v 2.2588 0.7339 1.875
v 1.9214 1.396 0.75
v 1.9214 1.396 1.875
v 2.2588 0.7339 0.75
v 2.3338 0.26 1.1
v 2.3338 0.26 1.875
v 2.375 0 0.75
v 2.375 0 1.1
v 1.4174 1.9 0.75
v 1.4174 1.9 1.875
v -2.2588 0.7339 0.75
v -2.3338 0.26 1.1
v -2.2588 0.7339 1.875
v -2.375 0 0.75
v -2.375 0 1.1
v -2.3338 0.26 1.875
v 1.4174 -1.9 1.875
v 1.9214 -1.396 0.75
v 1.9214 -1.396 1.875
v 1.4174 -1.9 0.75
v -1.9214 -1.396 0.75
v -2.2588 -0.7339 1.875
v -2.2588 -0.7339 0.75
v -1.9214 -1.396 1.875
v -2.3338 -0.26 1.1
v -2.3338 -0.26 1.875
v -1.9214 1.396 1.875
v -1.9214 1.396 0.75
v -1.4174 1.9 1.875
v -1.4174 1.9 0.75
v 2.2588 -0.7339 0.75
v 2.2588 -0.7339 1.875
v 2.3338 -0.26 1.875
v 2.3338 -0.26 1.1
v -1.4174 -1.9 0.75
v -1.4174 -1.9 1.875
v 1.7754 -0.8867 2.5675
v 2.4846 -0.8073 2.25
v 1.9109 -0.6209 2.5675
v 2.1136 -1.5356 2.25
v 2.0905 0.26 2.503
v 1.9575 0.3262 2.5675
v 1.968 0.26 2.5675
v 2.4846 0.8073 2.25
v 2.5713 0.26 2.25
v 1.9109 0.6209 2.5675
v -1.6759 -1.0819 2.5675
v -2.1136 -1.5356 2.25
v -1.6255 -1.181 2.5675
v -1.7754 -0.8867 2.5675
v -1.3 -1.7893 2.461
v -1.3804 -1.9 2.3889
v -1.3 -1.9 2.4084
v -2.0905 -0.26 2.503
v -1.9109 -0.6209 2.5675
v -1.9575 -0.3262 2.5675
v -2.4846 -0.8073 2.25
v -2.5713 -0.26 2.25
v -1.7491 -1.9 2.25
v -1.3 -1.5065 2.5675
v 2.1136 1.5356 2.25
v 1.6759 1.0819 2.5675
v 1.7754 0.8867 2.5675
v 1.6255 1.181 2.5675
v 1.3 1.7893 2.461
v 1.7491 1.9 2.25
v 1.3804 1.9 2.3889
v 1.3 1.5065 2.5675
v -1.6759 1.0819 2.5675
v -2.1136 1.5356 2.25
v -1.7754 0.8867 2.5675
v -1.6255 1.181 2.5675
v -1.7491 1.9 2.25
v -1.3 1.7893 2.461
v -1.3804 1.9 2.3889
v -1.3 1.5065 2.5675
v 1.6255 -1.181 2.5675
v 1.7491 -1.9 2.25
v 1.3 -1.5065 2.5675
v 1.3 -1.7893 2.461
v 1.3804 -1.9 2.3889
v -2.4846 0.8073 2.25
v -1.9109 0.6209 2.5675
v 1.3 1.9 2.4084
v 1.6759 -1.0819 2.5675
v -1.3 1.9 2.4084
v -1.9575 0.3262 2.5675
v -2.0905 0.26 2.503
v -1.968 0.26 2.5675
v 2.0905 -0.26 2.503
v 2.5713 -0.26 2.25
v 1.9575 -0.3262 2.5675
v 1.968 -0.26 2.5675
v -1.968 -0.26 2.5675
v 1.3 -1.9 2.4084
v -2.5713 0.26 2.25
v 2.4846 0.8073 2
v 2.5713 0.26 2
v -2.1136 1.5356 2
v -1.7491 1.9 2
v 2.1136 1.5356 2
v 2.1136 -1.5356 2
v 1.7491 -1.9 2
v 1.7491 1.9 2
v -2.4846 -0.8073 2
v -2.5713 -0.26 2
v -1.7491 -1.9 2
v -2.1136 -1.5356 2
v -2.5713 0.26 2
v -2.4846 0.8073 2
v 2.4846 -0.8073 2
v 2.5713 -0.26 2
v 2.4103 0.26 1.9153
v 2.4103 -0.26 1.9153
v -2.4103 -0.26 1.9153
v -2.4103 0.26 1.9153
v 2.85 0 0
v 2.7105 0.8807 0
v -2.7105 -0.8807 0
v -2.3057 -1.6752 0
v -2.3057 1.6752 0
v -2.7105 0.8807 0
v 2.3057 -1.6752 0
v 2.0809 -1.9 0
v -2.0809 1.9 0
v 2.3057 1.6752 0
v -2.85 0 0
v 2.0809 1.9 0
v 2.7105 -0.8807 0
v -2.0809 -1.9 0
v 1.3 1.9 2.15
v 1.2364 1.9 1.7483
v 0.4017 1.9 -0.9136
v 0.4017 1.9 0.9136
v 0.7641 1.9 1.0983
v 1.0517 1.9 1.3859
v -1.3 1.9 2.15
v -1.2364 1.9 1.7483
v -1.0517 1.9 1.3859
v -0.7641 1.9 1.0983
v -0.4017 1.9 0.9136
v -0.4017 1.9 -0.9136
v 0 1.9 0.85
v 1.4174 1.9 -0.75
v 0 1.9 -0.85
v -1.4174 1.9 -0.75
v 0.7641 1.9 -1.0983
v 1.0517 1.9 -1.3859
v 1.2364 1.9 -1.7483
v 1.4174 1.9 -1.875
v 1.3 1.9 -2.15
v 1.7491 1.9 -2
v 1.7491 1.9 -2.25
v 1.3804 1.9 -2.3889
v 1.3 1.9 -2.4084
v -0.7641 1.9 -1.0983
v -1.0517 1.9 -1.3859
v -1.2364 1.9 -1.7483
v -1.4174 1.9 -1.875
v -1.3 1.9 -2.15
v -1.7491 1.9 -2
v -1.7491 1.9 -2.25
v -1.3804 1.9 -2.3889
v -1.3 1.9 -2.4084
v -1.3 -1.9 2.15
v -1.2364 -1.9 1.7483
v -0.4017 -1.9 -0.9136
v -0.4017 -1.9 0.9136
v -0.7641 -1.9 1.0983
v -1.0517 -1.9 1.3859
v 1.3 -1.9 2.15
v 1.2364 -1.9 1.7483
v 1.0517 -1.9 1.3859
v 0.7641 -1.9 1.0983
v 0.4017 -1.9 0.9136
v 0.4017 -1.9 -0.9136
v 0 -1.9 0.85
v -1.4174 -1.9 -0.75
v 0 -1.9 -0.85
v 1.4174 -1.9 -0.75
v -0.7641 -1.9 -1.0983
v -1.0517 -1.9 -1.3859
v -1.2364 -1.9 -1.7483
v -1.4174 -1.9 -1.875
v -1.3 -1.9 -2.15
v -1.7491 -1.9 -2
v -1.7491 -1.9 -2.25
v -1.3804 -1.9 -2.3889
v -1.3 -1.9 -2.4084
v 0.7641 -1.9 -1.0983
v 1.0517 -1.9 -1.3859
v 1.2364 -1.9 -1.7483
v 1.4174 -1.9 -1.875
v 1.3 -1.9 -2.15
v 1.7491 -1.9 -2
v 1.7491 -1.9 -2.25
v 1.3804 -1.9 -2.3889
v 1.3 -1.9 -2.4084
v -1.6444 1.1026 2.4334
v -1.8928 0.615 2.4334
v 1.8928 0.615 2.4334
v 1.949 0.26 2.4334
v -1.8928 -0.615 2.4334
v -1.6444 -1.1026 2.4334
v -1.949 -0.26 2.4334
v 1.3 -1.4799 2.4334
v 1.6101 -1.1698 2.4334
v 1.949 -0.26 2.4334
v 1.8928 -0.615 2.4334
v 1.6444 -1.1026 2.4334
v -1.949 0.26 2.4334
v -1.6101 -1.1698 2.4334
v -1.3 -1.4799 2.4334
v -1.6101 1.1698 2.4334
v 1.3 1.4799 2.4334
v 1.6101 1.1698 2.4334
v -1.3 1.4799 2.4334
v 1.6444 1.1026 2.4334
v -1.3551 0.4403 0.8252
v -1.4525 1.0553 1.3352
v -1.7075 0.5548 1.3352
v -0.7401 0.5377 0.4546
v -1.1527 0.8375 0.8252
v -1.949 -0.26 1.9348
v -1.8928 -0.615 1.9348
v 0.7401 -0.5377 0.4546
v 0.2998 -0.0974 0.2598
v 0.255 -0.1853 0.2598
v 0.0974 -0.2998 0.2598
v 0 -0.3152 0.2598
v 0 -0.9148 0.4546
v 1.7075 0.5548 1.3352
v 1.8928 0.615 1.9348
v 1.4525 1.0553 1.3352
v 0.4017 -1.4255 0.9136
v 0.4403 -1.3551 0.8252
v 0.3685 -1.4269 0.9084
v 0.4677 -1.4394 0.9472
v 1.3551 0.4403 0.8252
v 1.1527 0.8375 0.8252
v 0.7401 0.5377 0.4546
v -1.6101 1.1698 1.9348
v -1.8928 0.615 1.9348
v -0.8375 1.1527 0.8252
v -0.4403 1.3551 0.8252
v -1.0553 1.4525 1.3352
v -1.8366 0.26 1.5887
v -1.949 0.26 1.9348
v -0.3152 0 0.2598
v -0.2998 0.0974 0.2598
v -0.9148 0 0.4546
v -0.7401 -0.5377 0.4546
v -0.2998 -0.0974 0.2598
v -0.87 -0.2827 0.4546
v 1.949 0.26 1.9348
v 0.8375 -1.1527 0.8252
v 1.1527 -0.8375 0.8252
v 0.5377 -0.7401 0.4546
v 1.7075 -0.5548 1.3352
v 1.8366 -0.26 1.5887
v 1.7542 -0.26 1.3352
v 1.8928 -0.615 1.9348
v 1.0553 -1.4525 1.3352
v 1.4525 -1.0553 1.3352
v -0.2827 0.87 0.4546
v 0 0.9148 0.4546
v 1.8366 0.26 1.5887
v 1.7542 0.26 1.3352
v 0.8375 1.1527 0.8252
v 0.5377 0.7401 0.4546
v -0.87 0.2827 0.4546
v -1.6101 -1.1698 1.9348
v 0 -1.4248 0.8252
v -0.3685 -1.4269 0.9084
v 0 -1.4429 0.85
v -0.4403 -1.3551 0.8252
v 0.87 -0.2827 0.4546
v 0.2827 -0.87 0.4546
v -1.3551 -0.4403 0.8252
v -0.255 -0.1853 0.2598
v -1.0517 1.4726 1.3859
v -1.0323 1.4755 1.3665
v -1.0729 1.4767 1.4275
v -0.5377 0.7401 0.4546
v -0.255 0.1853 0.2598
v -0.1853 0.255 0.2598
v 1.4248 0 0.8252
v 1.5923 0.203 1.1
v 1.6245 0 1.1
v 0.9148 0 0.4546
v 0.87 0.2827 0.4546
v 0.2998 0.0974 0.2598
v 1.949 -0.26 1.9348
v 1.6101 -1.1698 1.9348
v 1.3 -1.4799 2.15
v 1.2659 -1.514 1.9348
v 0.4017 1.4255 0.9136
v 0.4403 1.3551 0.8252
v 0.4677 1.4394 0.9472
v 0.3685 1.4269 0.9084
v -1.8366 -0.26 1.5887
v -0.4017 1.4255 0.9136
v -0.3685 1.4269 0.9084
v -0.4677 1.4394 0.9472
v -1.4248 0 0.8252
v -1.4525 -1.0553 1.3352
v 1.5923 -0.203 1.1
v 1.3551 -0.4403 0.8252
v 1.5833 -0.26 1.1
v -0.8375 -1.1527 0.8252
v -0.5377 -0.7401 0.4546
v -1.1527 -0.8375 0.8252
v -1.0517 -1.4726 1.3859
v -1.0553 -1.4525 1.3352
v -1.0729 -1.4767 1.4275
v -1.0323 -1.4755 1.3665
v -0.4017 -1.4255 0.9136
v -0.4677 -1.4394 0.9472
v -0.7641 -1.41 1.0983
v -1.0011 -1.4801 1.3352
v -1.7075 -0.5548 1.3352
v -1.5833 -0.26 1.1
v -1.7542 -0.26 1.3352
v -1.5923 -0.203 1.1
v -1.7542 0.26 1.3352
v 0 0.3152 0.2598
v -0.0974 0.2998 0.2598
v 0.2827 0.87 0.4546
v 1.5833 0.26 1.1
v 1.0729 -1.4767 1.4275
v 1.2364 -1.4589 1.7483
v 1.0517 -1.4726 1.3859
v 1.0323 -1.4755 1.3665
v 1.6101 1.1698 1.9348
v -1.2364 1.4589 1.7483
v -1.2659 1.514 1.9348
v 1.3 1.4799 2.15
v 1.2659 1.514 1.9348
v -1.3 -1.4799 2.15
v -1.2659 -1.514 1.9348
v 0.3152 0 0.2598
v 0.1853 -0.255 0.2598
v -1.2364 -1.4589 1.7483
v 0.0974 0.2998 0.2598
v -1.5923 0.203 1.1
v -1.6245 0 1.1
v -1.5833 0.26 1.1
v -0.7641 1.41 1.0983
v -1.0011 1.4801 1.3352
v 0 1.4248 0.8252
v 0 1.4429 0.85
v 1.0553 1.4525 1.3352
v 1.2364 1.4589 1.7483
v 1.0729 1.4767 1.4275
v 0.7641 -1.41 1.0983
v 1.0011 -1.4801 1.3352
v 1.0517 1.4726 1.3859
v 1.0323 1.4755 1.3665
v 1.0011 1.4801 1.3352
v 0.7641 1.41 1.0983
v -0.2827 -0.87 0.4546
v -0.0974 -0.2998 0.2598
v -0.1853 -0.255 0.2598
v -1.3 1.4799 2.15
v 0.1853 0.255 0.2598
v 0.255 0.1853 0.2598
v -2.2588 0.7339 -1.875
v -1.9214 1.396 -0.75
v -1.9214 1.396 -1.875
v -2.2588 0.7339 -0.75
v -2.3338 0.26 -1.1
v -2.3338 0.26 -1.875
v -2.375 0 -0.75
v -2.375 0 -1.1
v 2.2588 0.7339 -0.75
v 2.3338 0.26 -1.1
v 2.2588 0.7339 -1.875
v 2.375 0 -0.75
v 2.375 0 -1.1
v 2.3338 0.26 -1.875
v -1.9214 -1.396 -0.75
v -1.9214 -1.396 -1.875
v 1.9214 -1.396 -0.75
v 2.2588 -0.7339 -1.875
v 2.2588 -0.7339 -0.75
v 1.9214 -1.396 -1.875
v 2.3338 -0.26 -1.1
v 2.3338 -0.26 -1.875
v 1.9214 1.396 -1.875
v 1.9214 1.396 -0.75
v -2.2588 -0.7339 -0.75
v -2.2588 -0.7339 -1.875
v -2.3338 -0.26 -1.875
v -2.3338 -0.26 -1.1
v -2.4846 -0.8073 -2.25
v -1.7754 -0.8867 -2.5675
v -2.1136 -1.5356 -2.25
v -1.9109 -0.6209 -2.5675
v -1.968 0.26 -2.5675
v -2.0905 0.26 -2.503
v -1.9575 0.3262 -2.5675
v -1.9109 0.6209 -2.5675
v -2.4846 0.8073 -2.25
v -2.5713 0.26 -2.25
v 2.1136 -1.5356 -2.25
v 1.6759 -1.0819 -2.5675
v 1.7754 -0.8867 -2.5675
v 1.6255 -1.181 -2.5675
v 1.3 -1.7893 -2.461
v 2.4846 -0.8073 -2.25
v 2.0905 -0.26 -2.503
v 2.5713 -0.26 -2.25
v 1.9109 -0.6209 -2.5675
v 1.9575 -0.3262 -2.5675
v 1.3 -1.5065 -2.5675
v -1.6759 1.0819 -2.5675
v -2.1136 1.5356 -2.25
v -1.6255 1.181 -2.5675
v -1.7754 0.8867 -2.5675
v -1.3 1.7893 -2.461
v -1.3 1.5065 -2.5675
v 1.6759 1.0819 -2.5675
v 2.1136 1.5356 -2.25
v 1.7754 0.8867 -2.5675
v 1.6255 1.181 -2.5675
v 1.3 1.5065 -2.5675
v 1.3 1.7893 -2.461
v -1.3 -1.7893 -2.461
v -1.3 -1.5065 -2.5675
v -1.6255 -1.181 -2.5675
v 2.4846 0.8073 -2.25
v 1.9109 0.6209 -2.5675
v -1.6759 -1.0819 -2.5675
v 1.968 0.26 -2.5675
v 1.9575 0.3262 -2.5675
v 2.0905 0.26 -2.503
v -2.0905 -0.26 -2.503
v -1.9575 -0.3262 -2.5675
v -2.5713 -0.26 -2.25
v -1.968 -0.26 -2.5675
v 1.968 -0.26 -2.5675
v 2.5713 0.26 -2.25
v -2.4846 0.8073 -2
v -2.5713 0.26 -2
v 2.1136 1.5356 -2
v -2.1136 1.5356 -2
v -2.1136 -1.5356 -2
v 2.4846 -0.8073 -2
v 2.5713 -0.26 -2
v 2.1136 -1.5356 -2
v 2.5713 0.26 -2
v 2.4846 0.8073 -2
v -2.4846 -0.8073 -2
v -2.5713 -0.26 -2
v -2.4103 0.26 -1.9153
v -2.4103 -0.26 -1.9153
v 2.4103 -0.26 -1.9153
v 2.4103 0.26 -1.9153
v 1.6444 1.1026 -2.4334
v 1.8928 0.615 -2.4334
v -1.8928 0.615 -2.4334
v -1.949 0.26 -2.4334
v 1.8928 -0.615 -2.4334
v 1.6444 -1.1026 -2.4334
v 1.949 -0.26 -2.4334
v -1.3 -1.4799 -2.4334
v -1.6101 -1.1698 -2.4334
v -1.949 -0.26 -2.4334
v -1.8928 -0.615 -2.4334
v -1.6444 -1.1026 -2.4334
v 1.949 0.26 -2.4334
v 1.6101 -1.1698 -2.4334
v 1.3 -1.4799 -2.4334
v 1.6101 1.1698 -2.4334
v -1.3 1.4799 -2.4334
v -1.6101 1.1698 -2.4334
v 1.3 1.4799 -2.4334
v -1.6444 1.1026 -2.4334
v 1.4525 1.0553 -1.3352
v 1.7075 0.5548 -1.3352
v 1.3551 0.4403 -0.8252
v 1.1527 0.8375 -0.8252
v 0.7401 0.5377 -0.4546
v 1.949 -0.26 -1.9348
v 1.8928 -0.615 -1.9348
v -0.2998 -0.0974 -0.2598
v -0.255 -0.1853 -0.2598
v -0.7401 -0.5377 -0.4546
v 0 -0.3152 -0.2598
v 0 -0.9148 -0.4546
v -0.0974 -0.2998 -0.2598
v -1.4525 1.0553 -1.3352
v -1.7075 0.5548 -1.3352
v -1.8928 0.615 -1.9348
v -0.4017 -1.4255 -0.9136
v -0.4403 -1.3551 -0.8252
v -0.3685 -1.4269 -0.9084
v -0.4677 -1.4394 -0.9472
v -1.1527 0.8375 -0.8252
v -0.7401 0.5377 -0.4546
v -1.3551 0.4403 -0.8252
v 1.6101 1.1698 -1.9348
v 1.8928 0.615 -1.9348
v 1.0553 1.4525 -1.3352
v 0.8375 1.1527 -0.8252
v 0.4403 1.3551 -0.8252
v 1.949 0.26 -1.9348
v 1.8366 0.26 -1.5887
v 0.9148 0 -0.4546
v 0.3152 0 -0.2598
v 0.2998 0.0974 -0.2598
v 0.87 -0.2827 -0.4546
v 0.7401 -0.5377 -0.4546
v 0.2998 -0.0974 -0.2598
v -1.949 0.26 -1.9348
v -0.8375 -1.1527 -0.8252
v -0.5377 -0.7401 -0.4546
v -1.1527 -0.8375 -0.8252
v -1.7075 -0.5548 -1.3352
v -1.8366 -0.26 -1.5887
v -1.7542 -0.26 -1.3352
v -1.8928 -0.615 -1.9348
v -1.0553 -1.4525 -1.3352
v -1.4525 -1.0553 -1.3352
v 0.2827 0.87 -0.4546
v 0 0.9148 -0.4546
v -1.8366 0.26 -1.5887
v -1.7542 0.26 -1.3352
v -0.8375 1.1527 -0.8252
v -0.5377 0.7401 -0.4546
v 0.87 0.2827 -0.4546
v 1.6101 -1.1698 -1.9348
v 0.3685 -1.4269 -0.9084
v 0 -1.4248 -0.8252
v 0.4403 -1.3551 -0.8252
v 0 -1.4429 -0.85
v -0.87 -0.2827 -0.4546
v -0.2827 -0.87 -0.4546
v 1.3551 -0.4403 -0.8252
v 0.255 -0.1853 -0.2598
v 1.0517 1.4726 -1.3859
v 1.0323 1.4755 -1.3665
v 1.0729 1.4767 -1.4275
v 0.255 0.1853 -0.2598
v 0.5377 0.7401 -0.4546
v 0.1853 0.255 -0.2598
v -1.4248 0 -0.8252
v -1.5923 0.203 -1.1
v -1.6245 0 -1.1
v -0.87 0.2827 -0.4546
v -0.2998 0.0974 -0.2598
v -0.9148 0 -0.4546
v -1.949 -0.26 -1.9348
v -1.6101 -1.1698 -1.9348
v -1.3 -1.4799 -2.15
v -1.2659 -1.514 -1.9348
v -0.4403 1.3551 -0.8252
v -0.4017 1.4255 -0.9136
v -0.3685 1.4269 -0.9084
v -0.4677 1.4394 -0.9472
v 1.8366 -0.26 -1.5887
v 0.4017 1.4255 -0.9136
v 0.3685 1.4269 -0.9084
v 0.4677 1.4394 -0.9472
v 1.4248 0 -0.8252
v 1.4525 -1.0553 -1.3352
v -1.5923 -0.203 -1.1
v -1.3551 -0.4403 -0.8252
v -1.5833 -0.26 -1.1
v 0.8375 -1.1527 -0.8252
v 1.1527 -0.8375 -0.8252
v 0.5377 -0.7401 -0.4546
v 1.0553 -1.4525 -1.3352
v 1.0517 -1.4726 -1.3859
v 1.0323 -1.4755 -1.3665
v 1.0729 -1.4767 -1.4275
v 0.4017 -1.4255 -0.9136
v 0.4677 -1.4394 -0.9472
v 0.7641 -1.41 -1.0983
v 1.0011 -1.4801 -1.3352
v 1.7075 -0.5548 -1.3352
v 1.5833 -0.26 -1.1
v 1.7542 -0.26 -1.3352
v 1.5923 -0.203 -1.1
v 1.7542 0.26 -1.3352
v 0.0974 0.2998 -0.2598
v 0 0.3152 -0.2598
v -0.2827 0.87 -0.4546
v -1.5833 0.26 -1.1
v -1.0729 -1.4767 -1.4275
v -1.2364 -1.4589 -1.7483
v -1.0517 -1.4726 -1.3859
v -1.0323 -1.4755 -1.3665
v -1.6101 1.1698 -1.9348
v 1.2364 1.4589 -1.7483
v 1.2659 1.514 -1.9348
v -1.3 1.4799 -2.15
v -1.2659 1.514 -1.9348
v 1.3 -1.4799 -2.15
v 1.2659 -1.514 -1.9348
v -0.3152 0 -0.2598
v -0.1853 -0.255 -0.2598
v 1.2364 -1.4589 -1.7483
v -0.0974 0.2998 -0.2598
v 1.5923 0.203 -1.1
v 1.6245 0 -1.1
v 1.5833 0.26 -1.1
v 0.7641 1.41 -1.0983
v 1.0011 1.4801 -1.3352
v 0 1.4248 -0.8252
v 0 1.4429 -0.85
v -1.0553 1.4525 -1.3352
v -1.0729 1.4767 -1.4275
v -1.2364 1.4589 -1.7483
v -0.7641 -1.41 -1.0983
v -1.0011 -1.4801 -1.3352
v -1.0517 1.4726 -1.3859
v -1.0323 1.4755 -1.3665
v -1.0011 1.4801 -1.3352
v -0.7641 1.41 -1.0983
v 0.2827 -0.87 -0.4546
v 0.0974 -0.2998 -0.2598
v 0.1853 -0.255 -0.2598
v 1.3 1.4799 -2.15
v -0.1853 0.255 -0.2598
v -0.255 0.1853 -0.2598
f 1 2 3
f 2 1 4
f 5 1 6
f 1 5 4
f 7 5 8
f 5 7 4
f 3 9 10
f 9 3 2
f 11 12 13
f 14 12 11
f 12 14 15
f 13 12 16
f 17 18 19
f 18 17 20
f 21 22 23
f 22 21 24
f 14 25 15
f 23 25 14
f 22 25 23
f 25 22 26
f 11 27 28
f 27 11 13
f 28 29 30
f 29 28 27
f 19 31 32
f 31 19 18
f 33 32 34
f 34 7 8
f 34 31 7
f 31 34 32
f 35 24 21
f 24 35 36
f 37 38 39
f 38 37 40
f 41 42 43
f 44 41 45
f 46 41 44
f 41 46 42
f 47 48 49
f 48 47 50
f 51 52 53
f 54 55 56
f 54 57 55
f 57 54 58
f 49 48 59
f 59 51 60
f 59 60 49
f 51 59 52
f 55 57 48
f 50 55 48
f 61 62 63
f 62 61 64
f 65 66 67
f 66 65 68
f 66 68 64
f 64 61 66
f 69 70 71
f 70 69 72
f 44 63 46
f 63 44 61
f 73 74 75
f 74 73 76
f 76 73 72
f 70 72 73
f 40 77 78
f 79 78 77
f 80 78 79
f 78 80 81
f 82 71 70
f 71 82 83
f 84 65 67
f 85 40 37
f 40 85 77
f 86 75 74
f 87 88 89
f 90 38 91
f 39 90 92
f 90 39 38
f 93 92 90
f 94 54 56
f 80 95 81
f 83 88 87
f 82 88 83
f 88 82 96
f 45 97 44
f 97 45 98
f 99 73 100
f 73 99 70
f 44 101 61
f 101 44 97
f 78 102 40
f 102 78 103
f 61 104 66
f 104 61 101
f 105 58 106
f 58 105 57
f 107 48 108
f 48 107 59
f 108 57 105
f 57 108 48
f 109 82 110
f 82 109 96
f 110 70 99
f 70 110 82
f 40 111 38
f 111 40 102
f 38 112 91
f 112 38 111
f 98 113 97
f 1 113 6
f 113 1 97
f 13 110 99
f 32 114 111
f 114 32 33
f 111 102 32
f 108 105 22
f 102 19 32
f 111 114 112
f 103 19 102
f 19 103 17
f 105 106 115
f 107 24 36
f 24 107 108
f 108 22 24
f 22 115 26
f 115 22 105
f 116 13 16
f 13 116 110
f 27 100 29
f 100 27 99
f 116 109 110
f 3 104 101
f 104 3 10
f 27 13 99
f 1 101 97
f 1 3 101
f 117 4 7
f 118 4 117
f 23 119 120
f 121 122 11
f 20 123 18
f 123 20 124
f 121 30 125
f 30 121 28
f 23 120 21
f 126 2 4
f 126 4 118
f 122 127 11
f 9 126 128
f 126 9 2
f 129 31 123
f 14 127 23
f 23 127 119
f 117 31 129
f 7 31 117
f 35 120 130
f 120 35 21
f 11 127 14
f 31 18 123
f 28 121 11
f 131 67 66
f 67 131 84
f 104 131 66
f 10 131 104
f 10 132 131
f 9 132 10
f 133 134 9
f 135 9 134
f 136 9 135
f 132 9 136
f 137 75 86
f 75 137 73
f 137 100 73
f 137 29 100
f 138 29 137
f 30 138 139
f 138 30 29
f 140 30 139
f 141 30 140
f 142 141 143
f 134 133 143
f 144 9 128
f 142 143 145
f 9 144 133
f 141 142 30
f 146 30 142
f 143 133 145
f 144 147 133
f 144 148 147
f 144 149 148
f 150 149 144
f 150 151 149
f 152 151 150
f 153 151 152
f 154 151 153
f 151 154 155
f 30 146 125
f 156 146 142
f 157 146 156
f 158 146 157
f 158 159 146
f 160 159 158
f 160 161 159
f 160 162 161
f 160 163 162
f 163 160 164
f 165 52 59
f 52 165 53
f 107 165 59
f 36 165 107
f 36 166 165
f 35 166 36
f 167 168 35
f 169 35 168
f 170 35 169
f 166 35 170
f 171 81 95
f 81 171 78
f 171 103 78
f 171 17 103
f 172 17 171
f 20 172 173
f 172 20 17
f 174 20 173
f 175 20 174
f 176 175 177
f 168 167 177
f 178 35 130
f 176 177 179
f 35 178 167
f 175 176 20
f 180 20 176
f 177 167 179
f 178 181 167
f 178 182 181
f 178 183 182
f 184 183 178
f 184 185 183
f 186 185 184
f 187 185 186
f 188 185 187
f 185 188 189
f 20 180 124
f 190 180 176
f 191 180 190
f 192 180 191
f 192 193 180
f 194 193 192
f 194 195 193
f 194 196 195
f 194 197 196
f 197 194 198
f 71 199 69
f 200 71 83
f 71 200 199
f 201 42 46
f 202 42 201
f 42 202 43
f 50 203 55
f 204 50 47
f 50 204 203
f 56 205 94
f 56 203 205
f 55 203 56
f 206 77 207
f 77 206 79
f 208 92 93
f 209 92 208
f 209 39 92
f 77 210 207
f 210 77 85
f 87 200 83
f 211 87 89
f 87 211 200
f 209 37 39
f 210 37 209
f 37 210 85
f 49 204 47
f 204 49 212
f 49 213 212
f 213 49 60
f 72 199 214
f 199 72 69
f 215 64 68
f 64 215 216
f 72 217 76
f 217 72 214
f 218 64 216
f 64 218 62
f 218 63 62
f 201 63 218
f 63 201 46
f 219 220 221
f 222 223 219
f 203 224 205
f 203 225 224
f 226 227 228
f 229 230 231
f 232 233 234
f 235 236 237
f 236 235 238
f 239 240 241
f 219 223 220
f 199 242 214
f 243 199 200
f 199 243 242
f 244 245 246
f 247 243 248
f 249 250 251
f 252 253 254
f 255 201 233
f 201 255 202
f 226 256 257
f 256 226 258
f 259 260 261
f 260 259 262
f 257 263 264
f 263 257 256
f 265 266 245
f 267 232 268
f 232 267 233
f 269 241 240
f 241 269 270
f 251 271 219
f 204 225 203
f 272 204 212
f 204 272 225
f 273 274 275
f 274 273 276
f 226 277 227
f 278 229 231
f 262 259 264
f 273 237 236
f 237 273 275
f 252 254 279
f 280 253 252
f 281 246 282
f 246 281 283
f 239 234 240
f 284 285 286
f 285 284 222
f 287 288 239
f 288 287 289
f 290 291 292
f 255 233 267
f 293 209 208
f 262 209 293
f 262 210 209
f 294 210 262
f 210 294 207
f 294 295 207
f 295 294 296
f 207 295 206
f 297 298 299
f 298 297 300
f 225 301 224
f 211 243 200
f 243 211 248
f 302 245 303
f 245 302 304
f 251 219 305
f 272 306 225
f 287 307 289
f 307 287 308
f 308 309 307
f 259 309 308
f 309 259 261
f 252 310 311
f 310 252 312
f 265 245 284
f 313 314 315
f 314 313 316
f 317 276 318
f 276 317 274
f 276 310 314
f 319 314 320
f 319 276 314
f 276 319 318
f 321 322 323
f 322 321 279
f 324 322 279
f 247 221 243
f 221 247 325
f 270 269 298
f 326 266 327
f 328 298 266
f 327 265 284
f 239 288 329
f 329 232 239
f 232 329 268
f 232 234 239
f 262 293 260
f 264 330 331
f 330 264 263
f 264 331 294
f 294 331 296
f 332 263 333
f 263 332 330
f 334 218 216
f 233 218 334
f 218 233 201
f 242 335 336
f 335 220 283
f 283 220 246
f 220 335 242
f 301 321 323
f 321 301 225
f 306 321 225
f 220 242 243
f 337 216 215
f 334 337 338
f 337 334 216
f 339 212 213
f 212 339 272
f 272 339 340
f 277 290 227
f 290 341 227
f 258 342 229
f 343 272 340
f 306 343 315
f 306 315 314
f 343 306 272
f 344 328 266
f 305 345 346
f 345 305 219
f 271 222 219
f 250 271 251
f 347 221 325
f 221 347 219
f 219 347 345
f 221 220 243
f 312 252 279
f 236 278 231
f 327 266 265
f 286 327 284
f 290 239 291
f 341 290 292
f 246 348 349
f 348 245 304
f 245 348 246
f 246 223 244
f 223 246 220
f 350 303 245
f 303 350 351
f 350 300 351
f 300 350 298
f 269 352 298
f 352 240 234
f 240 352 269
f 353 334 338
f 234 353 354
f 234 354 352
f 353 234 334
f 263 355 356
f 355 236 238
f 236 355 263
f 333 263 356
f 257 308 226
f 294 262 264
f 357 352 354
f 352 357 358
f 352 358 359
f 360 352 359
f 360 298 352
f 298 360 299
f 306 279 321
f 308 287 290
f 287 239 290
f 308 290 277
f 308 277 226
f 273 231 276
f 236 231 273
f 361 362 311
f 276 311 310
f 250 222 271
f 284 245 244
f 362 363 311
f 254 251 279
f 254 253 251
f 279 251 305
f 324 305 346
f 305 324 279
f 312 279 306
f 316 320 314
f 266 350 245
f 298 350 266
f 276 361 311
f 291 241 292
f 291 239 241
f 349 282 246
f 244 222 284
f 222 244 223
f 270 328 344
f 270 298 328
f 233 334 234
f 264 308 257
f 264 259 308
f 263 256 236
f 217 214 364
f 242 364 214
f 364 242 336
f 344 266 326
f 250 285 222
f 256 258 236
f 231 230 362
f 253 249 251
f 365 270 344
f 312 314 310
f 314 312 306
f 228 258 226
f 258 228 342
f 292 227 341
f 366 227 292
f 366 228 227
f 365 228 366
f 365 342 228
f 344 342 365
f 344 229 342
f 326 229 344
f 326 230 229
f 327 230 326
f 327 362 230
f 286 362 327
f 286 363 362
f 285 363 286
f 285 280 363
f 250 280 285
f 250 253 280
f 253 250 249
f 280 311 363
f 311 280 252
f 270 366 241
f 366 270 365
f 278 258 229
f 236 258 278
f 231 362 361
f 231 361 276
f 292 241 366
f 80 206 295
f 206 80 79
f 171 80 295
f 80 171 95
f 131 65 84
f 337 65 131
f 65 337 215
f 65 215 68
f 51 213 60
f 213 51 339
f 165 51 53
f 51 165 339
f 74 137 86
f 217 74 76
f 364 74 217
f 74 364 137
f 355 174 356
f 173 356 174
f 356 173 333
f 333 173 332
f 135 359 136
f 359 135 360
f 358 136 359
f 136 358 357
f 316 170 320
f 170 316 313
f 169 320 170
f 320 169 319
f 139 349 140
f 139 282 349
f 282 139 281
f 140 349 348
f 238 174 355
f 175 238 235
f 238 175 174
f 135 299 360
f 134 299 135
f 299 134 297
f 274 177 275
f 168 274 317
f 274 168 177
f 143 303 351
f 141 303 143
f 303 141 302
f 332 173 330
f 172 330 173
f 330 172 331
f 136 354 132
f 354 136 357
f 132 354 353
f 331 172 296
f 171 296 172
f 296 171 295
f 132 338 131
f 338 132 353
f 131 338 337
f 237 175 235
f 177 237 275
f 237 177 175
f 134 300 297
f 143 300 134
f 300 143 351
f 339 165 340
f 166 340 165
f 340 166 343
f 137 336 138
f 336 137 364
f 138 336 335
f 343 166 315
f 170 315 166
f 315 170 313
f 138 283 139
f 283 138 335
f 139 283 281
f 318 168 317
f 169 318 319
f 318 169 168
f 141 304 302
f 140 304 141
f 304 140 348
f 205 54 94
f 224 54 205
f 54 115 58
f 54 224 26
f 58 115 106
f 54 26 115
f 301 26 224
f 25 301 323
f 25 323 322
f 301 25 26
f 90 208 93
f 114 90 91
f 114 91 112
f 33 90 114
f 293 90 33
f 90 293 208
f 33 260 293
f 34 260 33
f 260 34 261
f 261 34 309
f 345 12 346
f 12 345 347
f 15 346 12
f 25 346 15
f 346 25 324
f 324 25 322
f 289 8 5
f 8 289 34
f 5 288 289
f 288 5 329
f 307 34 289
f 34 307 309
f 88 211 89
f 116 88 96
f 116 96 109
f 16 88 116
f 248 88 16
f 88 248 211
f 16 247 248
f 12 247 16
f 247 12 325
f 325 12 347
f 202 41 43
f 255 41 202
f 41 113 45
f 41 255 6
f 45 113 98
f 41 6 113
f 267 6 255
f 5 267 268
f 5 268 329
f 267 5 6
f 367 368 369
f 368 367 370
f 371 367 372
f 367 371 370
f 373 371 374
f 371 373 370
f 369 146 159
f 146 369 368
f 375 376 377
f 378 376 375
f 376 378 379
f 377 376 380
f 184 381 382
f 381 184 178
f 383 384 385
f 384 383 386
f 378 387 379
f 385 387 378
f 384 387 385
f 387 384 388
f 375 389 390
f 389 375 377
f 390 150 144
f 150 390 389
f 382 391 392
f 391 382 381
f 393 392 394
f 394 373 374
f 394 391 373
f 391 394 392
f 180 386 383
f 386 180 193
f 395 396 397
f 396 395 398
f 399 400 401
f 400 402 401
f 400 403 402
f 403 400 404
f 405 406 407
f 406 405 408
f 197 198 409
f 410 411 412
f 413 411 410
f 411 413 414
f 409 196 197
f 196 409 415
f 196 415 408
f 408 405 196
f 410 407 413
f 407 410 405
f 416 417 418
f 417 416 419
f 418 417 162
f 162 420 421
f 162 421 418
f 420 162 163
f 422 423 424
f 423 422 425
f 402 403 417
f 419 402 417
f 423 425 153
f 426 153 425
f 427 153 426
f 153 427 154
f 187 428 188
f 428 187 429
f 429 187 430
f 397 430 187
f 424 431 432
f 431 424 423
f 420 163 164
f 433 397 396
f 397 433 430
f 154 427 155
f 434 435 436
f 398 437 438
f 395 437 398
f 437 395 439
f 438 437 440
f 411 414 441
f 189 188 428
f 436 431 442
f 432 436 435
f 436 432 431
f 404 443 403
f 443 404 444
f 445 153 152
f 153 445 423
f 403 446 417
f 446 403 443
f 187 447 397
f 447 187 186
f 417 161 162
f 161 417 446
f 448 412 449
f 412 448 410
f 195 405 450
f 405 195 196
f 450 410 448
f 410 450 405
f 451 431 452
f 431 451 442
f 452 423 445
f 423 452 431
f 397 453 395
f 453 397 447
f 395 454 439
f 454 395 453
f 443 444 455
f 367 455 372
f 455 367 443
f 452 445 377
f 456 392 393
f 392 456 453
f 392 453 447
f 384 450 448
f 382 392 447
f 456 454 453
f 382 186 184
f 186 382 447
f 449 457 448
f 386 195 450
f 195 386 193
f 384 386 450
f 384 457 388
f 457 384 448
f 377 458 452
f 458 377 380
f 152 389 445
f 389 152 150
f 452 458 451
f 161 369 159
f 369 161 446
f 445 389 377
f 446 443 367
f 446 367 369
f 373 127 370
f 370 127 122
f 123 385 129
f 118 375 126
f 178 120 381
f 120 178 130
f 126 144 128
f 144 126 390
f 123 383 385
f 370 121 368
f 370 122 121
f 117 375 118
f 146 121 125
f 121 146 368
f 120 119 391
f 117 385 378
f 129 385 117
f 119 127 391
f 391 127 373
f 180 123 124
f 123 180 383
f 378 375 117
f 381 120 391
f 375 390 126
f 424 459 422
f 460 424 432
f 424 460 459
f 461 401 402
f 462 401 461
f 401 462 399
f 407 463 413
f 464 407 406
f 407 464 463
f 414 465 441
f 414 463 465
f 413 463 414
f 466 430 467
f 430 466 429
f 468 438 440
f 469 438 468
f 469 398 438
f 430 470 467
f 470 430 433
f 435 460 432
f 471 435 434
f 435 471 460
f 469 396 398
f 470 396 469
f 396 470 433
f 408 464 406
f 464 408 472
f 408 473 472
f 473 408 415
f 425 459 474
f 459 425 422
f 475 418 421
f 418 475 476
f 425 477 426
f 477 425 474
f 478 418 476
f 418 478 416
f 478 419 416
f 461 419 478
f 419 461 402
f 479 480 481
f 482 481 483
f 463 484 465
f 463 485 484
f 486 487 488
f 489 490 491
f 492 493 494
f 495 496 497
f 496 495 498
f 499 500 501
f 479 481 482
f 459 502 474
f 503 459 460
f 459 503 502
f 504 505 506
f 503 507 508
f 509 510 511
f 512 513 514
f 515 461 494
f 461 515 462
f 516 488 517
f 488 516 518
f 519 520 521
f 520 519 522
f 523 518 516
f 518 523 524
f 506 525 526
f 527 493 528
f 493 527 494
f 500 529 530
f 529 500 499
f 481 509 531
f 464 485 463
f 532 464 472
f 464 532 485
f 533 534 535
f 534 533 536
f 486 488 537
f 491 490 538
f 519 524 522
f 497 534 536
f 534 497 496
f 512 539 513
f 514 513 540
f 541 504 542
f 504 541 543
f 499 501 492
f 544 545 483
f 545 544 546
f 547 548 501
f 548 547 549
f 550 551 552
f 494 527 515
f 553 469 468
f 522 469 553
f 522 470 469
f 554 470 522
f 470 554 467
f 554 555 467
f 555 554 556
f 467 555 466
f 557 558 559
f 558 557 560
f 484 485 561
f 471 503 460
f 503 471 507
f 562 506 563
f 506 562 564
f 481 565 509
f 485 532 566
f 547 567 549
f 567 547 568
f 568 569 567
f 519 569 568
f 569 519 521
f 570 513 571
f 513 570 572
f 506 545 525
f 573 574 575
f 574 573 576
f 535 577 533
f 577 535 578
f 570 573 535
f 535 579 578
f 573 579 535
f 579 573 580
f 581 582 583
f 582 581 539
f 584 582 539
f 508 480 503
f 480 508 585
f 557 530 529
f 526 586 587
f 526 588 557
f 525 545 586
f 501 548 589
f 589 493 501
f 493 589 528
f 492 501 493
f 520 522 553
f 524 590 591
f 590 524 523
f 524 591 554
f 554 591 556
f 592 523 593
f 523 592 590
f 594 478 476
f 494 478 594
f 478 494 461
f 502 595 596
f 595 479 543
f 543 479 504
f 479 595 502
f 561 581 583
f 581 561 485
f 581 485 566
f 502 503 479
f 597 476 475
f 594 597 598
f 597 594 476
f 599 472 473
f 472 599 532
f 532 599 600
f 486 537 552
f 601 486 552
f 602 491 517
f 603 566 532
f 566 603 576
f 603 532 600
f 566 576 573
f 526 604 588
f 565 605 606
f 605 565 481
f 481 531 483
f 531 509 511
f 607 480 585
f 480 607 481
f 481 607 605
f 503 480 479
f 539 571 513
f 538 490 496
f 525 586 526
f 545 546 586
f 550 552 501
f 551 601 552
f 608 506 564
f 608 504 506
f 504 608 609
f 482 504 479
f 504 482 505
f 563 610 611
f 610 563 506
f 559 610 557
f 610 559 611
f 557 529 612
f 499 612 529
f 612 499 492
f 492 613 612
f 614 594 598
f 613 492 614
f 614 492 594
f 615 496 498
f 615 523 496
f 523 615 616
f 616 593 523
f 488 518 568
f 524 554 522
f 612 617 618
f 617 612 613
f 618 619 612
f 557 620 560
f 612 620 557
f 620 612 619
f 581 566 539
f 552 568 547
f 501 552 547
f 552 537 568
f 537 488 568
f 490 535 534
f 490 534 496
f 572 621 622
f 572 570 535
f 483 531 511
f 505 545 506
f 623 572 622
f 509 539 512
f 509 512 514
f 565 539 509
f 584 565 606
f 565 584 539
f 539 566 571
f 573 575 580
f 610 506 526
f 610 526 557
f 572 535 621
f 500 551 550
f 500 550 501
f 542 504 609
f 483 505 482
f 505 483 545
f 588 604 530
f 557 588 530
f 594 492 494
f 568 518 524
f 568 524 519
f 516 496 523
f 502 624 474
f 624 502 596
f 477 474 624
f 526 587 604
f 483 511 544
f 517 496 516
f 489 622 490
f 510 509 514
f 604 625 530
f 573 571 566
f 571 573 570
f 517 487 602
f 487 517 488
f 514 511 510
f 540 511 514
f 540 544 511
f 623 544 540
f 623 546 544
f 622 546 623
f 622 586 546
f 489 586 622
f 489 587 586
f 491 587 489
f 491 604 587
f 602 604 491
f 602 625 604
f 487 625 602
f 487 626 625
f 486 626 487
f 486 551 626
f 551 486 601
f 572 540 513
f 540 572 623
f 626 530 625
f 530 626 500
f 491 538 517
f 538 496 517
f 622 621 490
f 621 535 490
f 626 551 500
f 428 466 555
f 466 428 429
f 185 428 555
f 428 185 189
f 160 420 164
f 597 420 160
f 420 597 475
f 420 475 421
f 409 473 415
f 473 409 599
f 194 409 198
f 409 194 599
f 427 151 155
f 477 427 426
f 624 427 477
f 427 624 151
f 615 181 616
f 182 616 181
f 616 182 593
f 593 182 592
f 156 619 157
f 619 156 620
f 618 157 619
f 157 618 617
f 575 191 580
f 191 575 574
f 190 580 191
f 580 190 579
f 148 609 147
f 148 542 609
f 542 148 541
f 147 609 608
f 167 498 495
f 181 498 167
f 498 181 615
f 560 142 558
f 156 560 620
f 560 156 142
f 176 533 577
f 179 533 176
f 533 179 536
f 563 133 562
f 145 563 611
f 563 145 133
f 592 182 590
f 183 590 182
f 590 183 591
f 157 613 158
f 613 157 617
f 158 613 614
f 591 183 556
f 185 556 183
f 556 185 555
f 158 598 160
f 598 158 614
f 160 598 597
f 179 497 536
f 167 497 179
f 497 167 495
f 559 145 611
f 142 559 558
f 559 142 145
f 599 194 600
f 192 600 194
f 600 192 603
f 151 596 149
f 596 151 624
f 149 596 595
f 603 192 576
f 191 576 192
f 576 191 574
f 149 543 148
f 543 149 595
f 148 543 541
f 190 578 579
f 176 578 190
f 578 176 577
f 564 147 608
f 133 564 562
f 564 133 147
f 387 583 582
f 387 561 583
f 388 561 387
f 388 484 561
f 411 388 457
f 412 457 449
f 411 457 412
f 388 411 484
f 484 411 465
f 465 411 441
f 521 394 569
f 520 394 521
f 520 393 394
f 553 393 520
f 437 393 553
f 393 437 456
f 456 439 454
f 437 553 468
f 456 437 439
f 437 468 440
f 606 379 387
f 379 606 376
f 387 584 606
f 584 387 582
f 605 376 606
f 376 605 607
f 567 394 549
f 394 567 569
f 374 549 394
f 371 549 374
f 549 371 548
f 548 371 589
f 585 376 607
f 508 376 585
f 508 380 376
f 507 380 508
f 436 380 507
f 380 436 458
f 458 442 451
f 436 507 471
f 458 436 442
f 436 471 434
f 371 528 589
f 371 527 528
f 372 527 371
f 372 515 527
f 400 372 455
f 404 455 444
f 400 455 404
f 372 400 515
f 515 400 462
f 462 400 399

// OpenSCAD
module pin(
pin_d = 5,
pin_h = 6,
pin_int_l = 5,
pin_int_d = 2,
extraL = 1,
object = 0,
pin_res = 20,
expand = 0,
rotate = 0
){
pin_d = pin_d + expand;
rotate([0,rotate,0])
difference(){
    union(){
    //cylinder
    cylinder( h = pin_h-1, d = pin_d, $fn=pin_res);
    //top
    translate([0,0,pin_h-1]) cylinder( h = 1+expand, d1 = pin_d*1.1, d2 = pin_d*0.70, $fn=pin_res);
    translate([0,0,pin_h-1.5]) cylinder( h = 0.5, d1 = pin_d*1.1, d2 = pin_d*1.1, $fn=pin_res);
    translate([0,0,pin_h-1.75-expand]) cylinder( h = 0.25+expand, d1 = pin_d, d2 = pin_d*1.1, $fn=pin_res);

    if(object == 0){
    translate([0,0,-0.05]) cylinder( h = 1.55, d1 = pin_d*1.2, d2 = pin_d, $fn=pin_res);
    translate([0,0,-1.55]) cylinder( h = 1.55, d1 = pin_d*1.2, d2 = pin_d*1.2, $fn=pin_res);
    if(extraL == 1){
    translate([0,0,pin_h]) cylinder( h = 4.5, d1 = pin_d*0.7, d2 = pin_d*0.7, $fn=pin_res);
    }
    }
    if(object == 1){
    translate([0,0,0]) cylinder( h = 1.5, d1 = pin_d*1.2, d2 = pin_d, $fn=pin_res);
    }
    }
if(object == 1 || object == 2){
//outside cut
translate([-pin_d, pin_d*0.4, -1]) cube([pin_d*2,pin_d,pin_h*1.2], $fn=pin_res);
translate([-pin_d, -pin_d*0.4-pin_d, -1]) cube([pin_d*2,pin_d,pin_h*1.2], $fn=pin_res);
}
if(object == 1){
//inside cut
//cylinder
translate([0, 0, pin_h/2 + (pin_h - pin_int_l)]) cylinder( d1 = pin_int_d*1.5, d2 = pin_int_d*1.8, h =pin_h, center = true, $fn=pin_res); 
//sphere
translate([0, 0, pin_int_d*1.5/2+0.6]) sphere (d =pin_int_d*1.55, $fn=pin_res);  
//cube
translate([0, 0, pin_h/2 + (pin_h - pin_int_l)]) cube([pin_int_d,pin_d,pin_h], center = true, $fn=pin_res);
//cylinder bottom
translate([0, 0, (pin_h - pin_int_l)])rotate([90,0,0])cylinder ( h = pin_d, d =pin_int_d,center = true, $fn=pin_res);  

//cube 2
rotate([0,0,90]) translate([0, 0, pin_h*0.9]) cube([pin_int_d*0.2,pin_d*1.5,pin_h], center = true, $fn=pin_res);

}
}
}

scale(v = [0.5,0.5,0.5]){
pin(pin_d = 9.5, pin_h = 5.5, pin_int_d = 5.2, pin_int_l = 1.2, object = 1);
pin(pin_d = 9.5, pin_h = 5.5, pin_int_d = 5.2, pin_int_l = 1.2, object = 1, rotate = 180);
}
